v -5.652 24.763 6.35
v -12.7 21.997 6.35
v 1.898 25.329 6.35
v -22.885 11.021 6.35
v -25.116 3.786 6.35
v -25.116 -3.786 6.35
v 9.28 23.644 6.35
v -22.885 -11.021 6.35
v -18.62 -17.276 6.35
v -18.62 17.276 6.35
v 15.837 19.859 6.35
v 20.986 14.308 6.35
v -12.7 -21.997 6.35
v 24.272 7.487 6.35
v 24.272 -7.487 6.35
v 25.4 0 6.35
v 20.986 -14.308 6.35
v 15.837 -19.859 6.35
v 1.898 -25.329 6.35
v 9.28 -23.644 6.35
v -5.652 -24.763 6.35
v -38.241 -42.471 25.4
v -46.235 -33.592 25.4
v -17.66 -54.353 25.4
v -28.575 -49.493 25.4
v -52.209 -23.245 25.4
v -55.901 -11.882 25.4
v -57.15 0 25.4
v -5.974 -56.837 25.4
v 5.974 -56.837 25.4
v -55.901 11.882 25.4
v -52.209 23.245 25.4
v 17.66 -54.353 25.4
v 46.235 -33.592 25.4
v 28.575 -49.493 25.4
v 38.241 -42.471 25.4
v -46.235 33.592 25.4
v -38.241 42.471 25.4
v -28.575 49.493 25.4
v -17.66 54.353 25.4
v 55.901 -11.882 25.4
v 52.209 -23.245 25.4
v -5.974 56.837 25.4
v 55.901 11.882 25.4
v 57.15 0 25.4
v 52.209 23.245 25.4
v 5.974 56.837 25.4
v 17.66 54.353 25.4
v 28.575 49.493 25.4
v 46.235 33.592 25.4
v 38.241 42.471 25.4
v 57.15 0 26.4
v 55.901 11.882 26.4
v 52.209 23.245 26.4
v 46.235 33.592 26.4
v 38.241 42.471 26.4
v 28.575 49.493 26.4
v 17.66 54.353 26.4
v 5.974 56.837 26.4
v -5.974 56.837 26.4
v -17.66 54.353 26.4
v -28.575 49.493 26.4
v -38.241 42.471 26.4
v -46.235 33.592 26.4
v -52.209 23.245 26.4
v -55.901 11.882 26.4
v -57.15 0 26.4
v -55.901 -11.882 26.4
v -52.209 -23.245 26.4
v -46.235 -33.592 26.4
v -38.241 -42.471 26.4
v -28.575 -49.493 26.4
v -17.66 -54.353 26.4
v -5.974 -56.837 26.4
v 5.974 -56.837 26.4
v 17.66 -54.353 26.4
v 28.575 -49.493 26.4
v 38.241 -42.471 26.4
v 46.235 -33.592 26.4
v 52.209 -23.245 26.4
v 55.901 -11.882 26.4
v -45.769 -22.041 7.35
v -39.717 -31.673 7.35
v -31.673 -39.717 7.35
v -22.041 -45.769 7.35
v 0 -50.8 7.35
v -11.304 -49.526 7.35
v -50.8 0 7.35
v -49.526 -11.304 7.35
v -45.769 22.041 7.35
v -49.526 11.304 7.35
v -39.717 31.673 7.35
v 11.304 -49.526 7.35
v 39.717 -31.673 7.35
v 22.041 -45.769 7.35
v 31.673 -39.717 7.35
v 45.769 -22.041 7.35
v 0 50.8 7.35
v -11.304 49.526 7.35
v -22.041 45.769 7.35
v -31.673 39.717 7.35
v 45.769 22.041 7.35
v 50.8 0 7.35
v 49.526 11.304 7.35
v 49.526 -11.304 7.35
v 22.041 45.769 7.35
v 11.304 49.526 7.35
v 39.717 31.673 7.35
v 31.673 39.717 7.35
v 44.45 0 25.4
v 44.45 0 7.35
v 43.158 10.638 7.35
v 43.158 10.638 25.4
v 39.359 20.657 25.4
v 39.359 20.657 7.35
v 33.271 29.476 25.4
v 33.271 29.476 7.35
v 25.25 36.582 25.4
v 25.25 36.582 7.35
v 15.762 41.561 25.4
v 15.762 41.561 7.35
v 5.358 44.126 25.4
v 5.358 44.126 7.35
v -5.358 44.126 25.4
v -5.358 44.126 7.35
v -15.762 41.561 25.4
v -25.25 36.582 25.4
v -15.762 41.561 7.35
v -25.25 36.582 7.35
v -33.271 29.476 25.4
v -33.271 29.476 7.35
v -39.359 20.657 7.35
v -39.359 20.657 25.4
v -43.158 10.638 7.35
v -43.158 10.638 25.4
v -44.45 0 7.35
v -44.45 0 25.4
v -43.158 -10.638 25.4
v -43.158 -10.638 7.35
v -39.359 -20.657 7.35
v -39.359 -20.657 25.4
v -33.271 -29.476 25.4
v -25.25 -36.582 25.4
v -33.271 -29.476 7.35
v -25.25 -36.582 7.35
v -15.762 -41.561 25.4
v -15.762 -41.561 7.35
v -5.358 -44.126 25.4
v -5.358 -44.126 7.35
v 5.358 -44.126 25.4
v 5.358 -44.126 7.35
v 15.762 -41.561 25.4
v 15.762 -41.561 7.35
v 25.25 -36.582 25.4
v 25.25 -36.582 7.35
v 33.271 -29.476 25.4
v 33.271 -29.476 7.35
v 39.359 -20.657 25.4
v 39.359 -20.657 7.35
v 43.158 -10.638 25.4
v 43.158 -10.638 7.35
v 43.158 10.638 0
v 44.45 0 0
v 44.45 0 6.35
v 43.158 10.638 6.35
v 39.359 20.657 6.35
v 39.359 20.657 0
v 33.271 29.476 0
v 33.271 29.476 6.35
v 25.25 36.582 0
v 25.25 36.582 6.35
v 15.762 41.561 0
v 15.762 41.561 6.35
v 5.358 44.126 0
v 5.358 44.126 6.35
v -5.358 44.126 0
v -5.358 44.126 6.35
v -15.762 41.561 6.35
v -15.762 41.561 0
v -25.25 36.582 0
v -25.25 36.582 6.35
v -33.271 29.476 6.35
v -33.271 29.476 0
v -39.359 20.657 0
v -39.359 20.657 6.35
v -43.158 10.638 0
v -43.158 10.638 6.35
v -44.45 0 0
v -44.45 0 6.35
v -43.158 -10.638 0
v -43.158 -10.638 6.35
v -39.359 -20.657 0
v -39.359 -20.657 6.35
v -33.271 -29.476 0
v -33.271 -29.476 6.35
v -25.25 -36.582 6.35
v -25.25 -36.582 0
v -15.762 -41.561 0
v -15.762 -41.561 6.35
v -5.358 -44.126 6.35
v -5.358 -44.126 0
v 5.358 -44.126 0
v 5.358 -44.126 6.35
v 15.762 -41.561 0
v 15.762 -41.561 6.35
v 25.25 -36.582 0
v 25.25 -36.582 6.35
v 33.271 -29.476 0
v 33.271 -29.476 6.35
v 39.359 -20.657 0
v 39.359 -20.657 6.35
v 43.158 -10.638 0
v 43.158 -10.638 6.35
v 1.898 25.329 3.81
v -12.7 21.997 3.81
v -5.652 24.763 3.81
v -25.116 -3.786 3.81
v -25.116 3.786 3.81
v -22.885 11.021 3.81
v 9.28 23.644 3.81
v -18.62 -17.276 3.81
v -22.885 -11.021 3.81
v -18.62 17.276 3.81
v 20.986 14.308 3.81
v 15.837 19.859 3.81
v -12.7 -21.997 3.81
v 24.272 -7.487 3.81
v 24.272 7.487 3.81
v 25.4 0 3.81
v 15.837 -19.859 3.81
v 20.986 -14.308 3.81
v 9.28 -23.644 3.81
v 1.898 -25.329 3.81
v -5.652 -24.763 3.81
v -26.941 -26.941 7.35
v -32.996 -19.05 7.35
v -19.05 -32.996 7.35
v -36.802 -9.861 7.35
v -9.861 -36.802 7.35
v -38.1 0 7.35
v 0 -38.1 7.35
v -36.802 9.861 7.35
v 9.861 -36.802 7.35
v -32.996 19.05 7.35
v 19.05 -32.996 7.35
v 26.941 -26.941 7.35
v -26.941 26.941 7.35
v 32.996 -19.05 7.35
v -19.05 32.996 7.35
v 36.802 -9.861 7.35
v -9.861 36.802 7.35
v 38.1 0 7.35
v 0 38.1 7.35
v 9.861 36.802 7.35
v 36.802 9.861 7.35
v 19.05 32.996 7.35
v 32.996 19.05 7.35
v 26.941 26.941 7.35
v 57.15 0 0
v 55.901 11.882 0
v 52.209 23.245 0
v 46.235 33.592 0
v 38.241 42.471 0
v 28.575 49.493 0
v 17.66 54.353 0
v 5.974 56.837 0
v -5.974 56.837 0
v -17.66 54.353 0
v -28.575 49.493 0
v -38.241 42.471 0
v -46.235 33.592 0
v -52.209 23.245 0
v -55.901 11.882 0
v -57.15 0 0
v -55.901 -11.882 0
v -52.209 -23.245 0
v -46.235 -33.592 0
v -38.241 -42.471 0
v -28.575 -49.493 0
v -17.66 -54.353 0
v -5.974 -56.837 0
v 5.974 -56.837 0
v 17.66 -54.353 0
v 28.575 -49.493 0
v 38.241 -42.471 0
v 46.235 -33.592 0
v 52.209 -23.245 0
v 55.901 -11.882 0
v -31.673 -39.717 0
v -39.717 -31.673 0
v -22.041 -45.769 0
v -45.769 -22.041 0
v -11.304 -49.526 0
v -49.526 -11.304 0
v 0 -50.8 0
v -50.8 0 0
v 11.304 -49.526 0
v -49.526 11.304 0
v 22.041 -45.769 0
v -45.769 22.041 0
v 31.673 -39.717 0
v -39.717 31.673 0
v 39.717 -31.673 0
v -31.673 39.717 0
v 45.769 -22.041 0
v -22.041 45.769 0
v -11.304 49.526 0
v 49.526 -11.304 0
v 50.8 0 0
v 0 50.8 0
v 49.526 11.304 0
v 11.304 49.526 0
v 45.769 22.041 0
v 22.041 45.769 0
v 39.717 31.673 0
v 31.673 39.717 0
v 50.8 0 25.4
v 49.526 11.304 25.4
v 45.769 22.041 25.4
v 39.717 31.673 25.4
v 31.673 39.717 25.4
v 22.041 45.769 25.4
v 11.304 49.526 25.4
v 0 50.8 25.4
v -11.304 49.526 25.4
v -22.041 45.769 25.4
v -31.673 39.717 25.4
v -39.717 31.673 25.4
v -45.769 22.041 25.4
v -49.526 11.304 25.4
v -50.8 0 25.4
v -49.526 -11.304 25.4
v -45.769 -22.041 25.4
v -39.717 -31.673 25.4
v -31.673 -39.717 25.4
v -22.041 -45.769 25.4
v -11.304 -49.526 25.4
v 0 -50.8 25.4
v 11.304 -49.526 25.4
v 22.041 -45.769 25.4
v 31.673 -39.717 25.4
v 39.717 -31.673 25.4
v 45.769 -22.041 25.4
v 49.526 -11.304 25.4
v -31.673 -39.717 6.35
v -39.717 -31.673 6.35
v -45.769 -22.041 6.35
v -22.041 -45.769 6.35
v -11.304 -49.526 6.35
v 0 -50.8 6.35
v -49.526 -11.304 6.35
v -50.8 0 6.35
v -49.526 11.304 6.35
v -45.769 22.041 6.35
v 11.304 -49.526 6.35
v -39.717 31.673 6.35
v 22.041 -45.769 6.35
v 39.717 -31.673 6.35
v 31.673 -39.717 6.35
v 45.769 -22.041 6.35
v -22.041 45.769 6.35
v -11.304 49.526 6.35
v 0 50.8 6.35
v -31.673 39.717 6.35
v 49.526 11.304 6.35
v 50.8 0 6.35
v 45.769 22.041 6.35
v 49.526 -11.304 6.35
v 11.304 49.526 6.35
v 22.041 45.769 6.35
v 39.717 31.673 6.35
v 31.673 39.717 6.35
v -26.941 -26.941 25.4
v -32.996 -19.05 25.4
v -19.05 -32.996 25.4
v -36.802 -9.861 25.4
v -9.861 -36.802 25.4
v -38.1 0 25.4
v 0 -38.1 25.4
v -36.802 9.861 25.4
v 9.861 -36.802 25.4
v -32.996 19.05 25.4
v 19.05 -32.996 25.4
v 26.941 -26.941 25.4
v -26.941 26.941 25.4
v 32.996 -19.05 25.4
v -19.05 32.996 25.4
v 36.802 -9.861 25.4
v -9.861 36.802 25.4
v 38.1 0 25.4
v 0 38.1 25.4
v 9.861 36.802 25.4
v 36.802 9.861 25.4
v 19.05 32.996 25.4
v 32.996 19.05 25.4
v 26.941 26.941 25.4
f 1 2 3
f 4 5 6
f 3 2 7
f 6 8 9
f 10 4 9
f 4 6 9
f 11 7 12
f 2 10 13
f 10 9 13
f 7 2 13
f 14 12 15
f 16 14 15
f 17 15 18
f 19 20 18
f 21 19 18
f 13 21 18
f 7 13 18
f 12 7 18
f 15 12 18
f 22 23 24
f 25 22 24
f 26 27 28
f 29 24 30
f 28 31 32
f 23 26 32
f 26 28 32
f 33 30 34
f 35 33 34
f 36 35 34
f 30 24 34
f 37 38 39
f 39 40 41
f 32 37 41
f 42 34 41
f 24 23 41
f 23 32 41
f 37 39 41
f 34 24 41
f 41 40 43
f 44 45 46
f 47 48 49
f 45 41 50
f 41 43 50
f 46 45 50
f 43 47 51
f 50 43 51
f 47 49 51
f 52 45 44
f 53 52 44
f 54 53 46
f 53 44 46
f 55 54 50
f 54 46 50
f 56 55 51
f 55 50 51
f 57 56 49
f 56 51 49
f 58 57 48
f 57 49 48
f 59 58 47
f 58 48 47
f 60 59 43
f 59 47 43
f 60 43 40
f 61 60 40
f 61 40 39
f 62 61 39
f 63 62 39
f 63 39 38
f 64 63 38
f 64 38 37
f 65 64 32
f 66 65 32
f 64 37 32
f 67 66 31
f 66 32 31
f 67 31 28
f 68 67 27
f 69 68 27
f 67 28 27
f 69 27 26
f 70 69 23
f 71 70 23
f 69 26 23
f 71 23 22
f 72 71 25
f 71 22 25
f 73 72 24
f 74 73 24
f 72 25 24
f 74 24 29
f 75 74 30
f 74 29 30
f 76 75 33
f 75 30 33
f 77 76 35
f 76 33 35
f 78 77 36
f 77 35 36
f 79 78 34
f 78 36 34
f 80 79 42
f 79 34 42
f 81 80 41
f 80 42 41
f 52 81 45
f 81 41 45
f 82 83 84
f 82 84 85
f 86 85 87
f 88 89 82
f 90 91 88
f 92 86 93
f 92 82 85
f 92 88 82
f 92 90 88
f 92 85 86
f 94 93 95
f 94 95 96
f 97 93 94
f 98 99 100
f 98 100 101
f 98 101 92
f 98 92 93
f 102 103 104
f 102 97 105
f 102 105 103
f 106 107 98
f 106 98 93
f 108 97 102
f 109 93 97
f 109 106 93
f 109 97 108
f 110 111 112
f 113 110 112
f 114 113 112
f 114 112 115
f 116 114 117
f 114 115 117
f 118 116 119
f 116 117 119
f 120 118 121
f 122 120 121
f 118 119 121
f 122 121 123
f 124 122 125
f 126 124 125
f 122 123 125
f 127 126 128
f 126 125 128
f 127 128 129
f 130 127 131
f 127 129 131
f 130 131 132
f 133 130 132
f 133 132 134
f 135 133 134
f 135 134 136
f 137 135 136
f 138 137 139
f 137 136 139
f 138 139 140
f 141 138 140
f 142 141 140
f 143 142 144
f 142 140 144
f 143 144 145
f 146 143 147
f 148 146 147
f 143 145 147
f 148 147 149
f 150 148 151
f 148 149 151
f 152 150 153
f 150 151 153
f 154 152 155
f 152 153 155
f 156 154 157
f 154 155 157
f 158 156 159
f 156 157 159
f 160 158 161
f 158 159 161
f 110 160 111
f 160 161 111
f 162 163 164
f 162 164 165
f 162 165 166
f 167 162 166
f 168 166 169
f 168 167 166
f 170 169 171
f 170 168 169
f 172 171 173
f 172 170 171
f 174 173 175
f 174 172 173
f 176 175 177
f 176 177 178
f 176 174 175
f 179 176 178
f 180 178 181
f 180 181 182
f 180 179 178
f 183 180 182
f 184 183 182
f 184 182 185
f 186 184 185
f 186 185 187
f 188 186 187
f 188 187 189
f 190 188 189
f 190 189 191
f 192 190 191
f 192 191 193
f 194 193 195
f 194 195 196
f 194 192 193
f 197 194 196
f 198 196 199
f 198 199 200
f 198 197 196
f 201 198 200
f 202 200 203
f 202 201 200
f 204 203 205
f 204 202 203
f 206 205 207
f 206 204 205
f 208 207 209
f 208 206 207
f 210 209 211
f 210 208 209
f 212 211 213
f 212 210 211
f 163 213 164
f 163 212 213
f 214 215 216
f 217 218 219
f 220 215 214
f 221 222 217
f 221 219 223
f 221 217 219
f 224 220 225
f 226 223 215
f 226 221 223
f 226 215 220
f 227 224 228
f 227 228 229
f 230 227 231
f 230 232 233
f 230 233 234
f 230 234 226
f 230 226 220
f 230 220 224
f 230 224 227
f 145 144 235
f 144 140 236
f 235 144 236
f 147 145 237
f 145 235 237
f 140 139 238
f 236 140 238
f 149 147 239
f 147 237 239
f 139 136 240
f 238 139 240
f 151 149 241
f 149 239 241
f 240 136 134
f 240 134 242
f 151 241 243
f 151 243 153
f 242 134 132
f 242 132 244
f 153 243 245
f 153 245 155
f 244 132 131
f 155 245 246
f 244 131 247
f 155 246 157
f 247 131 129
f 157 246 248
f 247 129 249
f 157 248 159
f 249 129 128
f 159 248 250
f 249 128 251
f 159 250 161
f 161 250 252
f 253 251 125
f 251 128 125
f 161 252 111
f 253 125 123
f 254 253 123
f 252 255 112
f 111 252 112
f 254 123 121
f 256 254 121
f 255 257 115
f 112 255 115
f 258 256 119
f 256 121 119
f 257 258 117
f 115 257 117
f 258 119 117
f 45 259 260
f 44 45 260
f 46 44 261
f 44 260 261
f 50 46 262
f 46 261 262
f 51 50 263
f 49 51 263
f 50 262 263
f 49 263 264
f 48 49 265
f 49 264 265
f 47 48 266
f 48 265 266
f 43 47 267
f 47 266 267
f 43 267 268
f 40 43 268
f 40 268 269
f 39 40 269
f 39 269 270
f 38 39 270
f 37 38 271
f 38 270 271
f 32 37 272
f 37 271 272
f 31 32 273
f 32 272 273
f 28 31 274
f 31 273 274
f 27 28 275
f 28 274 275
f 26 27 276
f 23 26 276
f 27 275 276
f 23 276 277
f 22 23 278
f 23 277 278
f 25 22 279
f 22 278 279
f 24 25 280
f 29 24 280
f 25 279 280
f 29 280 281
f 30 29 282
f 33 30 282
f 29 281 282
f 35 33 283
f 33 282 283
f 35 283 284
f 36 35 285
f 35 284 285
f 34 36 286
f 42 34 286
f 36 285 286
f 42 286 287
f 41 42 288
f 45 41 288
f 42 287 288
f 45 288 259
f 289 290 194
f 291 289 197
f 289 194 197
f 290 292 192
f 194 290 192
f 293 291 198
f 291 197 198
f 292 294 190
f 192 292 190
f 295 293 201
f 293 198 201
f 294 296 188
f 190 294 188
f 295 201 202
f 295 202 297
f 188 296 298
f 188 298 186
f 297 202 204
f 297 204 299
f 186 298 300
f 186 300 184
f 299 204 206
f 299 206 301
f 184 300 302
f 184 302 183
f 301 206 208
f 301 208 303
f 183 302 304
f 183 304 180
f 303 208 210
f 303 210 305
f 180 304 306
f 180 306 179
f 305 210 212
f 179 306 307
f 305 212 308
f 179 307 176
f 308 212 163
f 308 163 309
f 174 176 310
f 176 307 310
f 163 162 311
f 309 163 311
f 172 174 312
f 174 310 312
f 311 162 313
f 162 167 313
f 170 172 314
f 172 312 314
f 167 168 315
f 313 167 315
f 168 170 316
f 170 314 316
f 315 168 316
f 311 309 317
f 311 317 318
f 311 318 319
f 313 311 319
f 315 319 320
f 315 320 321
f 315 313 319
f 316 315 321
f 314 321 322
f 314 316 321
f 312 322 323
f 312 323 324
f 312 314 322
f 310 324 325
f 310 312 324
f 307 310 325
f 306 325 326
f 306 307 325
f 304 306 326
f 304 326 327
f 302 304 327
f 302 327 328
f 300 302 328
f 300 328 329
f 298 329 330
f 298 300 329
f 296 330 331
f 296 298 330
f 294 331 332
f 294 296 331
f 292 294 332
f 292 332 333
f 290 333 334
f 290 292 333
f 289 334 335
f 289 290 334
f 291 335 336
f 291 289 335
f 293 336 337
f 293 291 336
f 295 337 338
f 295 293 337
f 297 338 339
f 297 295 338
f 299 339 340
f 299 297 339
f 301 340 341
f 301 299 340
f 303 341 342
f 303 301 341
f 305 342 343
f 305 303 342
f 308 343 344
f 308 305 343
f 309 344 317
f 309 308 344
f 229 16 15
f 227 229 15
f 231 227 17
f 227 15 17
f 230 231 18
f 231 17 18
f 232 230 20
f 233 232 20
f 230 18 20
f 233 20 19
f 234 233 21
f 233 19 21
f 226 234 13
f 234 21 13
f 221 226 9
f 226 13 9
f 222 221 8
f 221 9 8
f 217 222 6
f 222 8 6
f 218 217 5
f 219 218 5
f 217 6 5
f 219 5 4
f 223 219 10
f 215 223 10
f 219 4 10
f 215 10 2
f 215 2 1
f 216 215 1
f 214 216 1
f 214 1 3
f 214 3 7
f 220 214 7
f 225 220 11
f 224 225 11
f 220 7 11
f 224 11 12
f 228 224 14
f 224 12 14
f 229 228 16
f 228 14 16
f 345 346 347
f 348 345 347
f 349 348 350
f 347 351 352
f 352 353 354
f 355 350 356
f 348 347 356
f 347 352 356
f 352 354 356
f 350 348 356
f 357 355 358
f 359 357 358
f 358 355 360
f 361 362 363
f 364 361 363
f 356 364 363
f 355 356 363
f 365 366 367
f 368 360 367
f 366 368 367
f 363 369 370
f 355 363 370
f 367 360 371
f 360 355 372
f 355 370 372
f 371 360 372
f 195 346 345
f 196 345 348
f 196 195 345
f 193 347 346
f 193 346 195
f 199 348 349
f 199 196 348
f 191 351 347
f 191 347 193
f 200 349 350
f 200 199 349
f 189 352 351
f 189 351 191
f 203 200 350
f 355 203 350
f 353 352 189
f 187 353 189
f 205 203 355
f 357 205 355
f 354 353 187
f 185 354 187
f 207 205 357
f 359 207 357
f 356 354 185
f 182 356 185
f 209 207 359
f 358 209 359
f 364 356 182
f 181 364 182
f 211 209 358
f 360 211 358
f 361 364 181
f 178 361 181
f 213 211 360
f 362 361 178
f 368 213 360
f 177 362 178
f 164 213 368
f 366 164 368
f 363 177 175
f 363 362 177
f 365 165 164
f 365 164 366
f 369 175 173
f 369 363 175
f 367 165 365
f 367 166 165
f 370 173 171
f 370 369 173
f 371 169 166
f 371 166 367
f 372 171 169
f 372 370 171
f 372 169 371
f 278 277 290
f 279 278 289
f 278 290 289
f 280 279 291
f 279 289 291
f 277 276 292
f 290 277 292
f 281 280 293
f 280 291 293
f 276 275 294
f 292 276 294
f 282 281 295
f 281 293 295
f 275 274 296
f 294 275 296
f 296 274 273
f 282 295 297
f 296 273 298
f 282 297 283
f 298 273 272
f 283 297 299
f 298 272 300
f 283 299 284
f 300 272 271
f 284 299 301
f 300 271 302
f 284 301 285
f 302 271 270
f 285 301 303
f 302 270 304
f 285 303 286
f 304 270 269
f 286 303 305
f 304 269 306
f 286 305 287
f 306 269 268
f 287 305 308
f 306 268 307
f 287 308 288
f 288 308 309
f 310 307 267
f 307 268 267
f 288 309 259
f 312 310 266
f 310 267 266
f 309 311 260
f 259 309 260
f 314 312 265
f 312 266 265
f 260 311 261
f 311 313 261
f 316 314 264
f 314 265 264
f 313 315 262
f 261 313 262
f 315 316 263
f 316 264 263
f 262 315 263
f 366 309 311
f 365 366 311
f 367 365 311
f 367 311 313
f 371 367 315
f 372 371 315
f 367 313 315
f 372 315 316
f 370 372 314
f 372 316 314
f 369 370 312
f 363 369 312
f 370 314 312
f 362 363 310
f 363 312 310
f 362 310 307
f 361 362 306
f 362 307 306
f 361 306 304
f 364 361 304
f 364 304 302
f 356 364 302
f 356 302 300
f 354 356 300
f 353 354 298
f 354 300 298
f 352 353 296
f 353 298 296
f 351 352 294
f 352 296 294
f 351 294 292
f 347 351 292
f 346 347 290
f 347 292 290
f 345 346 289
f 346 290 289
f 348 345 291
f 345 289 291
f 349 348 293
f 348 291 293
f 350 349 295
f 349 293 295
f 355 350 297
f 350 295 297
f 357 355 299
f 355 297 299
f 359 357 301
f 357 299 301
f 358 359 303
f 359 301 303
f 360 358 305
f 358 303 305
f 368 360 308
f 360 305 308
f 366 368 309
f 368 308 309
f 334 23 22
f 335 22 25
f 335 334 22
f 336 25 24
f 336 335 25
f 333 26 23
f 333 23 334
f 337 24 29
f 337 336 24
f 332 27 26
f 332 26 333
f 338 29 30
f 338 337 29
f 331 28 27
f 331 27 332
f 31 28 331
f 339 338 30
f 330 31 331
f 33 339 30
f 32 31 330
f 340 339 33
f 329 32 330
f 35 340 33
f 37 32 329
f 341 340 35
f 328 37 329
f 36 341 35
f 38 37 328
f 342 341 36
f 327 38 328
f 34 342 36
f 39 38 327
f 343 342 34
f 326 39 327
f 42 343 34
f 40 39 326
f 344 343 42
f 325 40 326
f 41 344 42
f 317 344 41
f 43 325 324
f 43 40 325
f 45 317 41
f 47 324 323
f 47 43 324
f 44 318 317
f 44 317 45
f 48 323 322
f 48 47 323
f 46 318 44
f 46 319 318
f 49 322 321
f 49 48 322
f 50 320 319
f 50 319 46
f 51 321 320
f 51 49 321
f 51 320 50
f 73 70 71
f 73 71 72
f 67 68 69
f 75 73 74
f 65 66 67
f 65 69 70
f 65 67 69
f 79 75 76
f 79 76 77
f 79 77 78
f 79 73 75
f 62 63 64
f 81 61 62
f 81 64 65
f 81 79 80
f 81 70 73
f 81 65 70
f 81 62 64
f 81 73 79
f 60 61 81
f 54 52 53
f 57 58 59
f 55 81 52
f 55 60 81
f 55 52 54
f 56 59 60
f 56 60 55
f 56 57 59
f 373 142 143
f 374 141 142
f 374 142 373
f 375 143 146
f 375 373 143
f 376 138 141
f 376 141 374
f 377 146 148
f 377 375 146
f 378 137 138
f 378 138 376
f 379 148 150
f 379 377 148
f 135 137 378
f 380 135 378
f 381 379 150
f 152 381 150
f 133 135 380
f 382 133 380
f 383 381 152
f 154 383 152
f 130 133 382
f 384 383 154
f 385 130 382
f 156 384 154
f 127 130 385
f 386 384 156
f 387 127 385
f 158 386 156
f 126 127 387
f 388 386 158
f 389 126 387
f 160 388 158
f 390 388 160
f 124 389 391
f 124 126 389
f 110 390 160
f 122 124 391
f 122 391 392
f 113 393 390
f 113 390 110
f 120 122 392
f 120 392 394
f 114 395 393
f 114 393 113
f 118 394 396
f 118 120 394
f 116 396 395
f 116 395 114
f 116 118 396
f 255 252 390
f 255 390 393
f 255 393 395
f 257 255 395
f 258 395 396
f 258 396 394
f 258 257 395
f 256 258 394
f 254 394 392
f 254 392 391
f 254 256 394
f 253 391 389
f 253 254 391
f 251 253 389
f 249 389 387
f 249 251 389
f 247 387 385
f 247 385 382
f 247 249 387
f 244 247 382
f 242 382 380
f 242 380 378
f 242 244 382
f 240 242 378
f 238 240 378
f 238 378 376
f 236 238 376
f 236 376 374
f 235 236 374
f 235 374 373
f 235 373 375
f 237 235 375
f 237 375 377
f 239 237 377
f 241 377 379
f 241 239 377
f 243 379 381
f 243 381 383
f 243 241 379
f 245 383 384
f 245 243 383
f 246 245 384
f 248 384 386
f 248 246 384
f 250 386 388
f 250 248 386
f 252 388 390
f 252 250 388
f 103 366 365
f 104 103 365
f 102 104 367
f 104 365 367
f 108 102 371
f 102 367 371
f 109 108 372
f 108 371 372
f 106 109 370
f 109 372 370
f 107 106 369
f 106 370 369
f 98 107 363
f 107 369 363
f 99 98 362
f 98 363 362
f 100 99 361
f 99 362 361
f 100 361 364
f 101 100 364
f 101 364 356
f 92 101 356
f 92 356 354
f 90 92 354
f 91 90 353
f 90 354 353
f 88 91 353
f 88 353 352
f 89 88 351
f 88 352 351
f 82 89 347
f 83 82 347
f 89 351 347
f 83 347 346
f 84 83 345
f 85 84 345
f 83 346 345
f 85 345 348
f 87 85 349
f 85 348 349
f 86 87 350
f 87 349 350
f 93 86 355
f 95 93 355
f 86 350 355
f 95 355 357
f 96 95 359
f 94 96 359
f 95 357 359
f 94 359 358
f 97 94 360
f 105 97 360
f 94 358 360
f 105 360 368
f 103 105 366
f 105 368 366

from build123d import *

# Parameters (mm, degrees)
F0_R      = 50.8
F0_R_2    = 44.45
F1_DEPTH  = 6.35
F2_R      = 57.15
F2_R_2    = 50.8
F3_DEPTH  = 25.4
F4_R      = 50.8
F5_DEPTH  = 1
F6_R      = 44.45
F6_R_2    = 38.1
F7_DEPTH  = 18.05
F8_R      = 57.15
F9_DEPTH  = 1
F10_R     = 25.4
F11_DEPTH = 2.54


with BuildPart() as f1:
    # F0 (on Top) → F1 (new body)
    with BuildSketch(Plane.XY):
        Circle(F0_R)
        Circle(F0_R_2, mode=Mode.SUBTRACT)
    extrude(amount=F1_DEPTH)


with BuildPart() as f3:
    # F2 (on Top) → F3 (new body)
    with BuildSketch(Plane.XY):
        Circle(F2_R)
        Circle(F2_R_2, mode=Mode.SUBTRACT)
    extrude(amount=F3_DEPTH)


with BuildPart() as f5:
    # F4 (on face) → F5 (new body)
    with BuildSketch(Plane.XY.offset(6.35)):
        Circle(F4_R)
    extrude(amount=F5_DEPTH)


with BuildPart() as f7:
    # F6 (on face) → F7 (new body)
    with BuildSketch(Plane.XY.offset(7.35)):
        Circle(F6_R)
        Circle(F6_R_2, mode=Mode.SUBTRACT)
    extrude(amount=F7_DEPTH)


with BuildPart() as f9:
    # F8 (on face) → F9 (new body)
    with BuildSketch(Plane.XY.offset(25.4)):
        Circle(F8_R)
    extrude(amount=F9_DEPTH)


with BuildPart() as f11:
    # F10 (on face) → F11 (new body)
    with BuildSketch(Plane(origin=(0, 0, 6.35), x_dir=(1, 0, 0), z_dir=(0, 0, -1))):
        Circle(F10_R)
    extrude(amount=F11_DEPTH)


solid = Compound([f1.part, f3.part, f5.part, f7.part, f9.part, f11.part])
